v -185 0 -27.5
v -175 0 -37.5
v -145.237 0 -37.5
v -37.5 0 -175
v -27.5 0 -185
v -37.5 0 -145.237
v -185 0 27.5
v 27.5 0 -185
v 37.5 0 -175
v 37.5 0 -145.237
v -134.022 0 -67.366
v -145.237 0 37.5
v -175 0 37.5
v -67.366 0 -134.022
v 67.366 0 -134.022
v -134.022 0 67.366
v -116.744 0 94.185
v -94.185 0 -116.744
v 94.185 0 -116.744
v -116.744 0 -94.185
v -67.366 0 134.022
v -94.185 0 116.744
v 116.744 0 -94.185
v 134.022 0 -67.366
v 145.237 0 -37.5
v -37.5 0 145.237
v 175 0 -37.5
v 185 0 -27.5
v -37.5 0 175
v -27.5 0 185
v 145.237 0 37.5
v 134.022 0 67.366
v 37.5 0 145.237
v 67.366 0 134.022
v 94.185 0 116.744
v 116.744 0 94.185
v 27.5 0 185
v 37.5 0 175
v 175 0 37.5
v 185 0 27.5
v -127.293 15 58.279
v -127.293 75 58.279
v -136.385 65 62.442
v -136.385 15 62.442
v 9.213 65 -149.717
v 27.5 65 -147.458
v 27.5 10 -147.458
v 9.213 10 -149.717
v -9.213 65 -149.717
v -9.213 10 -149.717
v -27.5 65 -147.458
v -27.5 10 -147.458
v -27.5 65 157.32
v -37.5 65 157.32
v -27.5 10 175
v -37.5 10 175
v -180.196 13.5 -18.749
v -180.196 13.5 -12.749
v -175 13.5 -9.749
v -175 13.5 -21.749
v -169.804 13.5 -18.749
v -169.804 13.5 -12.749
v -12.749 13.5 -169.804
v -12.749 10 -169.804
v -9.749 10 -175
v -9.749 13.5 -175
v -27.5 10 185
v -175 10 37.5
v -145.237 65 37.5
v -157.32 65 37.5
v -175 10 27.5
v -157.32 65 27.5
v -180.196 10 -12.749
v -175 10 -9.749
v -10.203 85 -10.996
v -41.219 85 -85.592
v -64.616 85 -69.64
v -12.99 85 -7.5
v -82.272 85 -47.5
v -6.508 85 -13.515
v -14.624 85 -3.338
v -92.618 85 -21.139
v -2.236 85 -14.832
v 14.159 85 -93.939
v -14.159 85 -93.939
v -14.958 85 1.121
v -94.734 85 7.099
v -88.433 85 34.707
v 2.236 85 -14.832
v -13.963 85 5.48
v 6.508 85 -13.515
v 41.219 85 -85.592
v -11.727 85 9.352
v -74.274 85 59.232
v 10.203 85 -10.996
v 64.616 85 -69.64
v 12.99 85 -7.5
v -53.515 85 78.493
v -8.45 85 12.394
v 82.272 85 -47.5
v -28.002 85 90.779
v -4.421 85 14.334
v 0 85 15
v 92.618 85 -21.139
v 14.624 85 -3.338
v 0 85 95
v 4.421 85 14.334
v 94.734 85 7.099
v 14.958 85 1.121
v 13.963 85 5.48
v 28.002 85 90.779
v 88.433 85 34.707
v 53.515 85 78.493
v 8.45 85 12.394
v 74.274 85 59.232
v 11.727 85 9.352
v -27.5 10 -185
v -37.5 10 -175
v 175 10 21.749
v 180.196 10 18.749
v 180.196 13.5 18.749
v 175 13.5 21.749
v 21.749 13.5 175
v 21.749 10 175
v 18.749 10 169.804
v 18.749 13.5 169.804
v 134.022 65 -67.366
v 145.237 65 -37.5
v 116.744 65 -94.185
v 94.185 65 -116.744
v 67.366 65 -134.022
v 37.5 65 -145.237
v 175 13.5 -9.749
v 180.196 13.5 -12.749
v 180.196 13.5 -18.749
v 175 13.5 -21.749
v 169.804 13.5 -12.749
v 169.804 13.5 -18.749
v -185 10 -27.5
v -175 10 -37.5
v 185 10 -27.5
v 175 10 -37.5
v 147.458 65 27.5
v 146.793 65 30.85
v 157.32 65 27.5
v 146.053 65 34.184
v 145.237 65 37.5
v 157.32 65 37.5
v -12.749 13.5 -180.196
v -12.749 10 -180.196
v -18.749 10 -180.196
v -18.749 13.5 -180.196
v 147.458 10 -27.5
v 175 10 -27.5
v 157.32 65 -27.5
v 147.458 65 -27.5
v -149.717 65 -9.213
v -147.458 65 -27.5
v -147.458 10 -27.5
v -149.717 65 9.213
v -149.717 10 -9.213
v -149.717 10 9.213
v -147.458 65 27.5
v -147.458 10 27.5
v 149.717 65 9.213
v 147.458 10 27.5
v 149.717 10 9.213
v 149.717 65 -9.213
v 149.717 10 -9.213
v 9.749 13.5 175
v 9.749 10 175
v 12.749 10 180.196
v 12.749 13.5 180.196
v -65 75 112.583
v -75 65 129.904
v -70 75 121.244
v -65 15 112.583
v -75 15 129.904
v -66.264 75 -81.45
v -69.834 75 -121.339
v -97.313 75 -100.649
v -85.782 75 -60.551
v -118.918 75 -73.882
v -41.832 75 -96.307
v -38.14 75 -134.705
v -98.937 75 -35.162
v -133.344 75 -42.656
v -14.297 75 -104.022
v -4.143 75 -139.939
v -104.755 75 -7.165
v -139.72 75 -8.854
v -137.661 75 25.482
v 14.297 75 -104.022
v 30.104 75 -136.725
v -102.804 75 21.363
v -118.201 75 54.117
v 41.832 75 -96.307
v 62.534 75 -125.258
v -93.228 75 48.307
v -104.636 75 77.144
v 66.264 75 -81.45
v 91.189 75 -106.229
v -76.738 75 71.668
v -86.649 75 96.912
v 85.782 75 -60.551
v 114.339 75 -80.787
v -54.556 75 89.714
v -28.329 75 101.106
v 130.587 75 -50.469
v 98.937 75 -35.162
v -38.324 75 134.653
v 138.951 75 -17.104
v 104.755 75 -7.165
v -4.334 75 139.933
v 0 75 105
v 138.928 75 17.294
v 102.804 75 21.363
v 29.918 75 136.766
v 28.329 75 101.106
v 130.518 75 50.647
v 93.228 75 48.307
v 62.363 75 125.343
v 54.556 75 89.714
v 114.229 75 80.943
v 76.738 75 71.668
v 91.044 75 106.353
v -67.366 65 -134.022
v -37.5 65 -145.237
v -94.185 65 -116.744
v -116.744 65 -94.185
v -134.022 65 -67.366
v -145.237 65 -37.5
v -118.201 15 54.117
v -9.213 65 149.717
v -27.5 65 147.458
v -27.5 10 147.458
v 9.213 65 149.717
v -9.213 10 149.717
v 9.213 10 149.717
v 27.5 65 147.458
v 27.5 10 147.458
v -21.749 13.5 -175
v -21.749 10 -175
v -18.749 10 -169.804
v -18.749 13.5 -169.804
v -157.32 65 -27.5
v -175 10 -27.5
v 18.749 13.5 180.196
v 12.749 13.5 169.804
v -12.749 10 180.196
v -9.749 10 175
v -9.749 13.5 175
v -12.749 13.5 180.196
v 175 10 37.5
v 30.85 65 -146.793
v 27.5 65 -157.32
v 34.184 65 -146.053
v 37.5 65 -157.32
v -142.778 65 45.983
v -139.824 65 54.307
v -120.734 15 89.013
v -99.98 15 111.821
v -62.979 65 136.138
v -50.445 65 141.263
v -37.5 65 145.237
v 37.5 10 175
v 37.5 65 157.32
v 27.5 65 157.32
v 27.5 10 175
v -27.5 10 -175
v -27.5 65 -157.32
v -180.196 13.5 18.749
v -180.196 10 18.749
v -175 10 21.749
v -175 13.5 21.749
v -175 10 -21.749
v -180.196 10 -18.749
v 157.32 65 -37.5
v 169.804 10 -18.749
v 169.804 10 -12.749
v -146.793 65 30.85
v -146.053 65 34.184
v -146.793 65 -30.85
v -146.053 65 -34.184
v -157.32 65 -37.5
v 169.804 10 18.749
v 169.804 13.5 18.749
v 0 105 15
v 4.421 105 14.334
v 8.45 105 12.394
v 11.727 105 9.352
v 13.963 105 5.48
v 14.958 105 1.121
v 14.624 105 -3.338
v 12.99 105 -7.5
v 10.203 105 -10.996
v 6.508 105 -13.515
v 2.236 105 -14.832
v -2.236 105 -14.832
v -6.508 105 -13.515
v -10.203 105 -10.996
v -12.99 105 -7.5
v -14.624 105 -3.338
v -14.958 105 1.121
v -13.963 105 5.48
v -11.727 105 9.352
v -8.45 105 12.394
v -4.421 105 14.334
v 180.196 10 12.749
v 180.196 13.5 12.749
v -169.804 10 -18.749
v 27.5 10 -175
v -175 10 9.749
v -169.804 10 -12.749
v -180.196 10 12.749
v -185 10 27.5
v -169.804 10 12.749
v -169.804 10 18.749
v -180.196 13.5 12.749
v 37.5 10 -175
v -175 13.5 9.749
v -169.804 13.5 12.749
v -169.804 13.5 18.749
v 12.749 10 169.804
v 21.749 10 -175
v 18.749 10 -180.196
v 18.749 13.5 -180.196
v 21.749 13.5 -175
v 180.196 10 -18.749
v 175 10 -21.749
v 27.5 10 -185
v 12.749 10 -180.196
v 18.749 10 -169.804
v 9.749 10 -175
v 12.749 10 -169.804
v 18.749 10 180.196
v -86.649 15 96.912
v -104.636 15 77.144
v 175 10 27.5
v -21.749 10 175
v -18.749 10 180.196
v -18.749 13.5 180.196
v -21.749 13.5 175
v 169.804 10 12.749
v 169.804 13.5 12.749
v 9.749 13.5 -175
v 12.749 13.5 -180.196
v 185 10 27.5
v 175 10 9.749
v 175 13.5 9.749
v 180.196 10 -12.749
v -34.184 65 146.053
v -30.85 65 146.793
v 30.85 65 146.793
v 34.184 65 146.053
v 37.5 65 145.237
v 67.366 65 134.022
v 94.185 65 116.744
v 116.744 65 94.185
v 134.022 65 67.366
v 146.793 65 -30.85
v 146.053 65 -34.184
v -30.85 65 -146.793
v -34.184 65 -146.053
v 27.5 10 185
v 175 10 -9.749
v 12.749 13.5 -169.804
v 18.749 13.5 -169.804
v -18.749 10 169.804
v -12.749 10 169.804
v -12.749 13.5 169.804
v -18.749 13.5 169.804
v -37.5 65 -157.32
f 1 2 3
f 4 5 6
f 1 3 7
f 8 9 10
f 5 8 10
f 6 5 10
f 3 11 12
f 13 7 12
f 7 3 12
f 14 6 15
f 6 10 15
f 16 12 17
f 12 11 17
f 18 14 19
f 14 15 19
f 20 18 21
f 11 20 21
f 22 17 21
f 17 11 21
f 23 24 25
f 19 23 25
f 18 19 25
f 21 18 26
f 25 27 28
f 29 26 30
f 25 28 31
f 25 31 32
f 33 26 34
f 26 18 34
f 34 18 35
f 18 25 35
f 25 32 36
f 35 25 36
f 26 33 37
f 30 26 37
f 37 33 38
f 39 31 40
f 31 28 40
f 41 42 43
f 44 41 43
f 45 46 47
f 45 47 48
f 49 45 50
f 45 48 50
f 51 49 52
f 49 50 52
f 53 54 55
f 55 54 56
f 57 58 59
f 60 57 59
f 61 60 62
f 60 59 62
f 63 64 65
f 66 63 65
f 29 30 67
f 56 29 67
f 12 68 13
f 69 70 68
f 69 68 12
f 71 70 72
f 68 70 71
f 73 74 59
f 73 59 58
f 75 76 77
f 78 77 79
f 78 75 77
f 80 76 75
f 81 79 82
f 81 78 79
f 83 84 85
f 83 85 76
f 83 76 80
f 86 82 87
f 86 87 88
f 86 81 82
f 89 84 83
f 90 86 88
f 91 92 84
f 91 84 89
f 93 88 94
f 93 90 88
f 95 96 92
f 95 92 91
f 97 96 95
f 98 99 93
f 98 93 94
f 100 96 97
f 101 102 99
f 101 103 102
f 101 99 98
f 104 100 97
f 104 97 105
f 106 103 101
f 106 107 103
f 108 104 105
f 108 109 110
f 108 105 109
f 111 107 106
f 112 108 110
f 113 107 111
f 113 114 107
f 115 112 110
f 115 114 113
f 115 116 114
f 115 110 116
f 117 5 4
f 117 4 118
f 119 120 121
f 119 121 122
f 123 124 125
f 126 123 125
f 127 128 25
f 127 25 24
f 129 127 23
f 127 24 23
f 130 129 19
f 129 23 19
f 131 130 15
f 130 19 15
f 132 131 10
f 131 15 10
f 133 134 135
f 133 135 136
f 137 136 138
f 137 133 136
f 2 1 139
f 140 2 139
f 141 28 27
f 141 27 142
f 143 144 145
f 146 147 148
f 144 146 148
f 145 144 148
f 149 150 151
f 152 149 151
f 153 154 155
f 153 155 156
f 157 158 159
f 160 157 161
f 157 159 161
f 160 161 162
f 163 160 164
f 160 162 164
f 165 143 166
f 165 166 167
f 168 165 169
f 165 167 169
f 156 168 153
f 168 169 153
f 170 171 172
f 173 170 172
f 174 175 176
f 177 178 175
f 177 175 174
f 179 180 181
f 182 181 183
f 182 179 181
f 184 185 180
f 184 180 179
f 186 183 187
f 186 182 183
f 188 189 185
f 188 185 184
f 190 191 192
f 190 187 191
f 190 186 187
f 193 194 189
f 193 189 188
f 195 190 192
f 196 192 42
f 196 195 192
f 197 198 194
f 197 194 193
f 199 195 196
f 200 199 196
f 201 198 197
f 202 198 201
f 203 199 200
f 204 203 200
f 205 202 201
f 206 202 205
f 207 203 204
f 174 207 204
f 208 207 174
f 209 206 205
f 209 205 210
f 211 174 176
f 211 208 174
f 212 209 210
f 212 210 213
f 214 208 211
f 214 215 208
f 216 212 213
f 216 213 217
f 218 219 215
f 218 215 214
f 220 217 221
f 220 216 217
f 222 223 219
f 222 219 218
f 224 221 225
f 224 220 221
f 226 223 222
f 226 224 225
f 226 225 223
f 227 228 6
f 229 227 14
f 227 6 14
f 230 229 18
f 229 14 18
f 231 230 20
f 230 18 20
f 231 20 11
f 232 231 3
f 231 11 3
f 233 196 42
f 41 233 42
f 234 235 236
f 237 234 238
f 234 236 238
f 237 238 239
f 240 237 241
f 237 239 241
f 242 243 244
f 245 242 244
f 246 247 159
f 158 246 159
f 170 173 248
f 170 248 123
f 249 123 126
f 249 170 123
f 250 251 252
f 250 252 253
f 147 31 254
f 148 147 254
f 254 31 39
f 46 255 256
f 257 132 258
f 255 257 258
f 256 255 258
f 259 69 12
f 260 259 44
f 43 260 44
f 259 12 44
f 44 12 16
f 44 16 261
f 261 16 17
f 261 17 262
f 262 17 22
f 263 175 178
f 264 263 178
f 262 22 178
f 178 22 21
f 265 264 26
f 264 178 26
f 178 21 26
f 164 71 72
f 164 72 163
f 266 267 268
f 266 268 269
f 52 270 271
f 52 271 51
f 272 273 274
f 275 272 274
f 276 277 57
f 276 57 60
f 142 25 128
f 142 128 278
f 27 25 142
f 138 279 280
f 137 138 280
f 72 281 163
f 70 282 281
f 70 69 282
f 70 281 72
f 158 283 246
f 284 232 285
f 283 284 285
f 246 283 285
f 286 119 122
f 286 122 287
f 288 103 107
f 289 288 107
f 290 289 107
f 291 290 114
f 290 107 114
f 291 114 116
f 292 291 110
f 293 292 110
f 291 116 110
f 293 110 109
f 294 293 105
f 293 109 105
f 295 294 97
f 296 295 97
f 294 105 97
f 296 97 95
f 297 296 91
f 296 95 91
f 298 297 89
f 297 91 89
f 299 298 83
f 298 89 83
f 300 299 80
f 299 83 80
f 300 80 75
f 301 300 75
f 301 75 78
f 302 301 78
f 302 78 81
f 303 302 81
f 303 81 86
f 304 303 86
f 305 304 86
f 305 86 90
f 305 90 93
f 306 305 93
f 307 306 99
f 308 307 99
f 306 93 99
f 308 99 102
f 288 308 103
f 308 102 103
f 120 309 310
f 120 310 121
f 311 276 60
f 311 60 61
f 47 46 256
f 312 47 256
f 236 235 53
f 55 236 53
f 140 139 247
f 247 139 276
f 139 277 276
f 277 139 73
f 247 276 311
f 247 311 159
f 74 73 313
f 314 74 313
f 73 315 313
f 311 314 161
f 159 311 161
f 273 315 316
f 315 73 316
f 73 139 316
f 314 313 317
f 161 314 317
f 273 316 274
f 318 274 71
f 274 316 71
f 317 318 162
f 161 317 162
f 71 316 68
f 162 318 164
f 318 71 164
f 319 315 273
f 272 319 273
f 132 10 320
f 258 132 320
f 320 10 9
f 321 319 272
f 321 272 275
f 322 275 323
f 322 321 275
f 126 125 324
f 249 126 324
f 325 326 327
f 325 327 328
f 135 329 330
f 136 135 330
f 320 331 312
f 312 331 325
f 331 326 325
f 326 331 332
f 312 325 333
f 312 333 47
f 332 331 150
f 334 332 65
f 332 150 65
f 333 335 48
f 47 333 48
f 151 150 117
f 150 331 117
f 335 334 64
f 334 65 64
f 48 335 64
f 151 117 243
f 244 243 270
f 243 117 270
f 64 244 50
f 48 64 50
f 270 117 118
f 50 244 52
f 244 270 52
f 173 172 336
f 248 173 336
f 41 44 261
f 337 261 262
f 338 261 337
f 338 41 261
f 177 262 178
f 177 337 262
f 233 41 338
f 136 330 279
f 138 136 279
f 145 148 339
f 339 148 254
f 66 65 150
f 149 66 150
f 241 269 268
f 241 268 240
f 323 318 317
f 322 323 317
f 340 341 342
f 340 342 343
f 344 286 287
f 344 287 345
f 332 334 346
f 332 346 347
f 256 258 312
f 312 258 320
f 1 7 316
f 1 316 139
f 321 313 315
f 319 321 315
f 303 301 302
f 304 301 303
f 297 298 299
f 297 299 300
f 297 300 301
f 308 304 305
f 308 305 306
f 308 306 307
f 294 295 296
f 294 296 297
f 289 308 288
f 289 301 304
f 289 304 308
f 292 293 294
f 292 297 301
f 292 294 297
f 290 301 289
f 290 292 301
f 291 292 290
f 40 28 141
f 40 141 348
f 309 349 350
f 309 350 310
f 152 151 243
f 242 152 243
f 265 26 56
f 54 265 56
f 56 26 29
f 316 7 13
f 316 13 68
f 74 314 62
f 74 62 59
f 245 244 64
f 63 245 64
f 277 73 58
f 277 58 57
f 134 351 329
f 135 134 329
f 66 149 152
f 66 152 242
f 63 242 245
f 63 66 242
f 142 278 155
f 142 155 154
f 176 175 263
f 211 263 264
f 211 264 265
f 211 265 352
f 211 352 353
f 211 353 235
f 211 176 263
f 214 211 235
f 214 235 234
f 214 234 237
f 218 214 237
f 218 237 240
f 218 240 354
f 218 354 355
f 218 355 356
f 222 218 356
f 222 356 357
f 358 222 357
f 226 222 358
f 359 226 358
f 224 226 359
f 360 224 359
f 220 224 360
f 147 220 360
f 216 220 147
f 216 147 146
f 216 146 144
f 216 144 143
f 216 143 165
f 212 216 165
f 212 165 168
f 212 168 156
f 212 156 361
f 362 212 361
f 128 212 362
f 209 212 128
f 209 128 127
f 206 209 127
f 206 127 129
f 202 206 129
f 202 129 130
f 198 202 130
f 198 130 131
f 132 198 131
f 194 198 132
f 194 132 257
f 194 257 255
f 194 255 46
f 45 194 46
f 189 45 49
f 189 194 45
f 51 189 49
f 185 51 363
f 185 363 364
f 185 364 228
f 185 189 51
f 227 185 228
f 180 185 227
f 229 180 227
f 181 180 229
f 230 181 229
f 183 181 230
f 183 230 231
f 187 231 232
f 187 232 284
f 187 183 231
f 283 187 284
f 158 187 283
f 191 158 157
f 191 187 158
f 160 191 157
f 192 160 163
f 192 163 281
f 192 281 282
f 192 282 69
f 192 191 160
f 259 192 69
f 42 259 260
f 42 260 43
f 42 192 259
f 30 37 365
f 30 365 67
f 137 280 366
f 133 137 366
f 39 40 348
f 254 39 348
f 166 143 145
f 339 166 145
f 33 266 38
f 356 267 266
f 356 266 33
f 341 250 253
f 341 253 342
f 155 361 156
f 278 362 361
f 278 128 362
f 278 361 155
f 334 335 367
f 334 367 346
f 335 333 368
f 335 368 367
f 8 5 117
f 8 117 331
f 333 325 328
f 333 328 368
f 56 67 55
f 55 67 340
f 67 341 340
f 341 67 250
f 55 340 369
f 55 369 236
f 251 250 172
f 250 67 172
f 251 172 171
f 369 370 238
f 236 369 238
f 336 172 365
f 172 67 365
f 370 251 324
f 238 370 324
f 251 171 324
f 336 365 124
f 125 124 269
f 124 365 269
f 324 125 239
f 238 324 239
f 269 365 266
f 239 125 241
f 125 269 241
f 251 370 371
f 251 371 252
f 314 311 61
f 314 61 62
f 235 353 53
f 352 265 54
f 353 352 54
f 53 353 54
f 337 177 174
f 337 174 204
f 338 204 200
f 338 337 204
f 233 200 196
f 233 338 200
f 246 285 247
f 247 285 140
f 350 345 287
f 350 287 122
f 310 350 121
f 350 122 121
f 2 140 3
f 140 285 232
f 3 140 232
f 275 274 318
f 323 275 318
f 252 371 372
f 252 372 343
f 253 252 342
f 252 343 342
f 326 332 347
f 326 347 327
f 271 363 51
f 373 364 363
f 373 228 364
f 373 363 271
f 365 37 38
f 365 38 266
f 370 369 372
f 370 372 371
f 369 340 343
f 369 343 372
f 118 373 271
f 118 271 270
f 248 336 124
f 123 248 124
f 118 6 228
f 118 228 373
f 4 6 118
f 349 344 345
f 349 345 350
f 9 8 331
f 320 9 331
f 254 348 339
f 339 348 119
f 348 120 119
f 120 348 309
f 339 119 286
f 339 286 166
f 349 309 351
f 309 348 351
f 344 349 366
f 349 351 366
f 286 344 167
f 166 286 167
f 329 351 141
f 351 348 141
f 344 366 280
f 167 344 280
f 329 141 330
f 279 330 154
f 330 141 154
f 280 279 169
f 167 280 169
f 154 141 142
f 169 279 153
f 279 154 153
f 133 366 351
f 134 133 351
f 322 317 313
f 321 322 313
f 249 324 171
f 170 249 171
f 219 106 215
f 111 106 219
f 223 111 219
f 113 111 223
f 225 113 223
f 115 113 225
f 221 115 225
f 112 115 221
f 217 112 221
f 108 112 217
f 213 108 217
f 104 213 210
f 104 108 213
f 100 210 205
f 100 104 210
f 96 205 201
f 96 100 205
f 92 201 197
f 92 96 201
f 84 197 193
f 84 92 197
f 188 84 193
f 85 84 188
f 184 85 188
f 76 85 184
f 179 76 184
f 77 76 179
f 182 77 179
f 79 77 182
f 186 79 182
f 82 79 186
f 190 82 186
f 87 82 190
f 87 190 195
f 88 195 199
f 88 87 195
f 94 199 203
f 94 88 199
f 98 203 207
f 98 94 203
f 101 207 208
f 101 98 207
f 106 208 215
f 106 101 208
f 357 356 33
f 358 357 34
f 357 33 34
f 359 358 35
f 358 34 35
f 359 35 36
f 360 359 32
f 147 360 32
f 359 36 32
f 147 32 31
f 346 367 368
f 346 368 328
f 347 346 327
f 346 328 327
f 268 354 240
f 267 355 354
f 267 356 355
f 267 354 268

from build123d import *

# Parameters (mm, degrees)
SKETCH1_R                    = 150
BOSS_EXTRUDE1_DEPTH          = 75
CHAMFER1_SIZE                = 10
BOSS_EXTRUDE2_DEPTH          = 10
CHAMFER2_SIZE                = 10
BOSS_EXTRUDE3_DEPTH          = 10
BOSS_EXTRUDE4_DEPTH          = 3.5
CIRPATTERN1_COUNT            = 4
CIRPATTERN1_COPY_1_DEPTH     = 10
CIRPATTERN1_COPY_2_DEPTH     = 10
CIRPATTERN1_COPY_3_DEPTH     = 10
CIRPATTERN1_COPY_4_DEPTH     = 3.5
CIRPATTERN1_COPY_5_DEPTH     = 3.5
CIRPATTERN1_COPY_6_DEPTH     = 3.5
CHAMFER2_OF_CIRPATTERN1_SIZE = 10
CUT_EXTRUDE2_START           = -60
CUT_EXTRUDE2_DEPTH           = 60
SKETCH6_R                    = 110
BOSS_EXTRUDE5_DEPTH          = 10
CHAMFER3_SIZE                = 15
SKETCH7_R                    = 15
BOSS_EXTRUDE6_DEPTH          = 20


with BuildPart() as part:
    # Sketch1 → Boss-Extrude1 (new body)
    with BuildSketch(Plane(origin=(0, 0, 0), x_dir=(1, 0, 0), z_dir=(0, 1, 0))):
        with Locations(Location((0, 0, 0), (0, 0, 270))):
            Circle(SKETCH1_R)
    extrude(amount=BOSS_EXTRUDE1_DEPTH)

    # Chamfer1
    chamfer1_edges = [part.edges().sort_by_distance(p)[0] for p in [
        (0, 75, -150),
    ]]
    chamfer(chamfer1_edges, length=CHAMFER1_SIZE)

    # Sketch2 → Boss-Extrude2 (add)
    with BuildSketch(Plane.XZ):
        with BuildLine():
            Line((-145.236875483, 37.5), (-185, 37.5))
            Line((-185, 37.5), (-185, -37.5))
            Line((-185, -37.5), (-145.236875483, -37.5))
            ThreePointArc((-145.236875483, -37.5), (-150, 0), (-145.236875483, 37.5))
        make_face()
    boss_extrude2 = extrude(amount=-BOSS_EXTRUDE2_DEPTH)

    # Chamfer2
    chamfer2_edges = [part.edges().sort_by_distance(p)[0] for p in [
        (-185, 5, -37.5),
        (-185, 5, 37.5),
    ]]
    chamfer(chamfer2_edges, length=CHAMFER2_SIZE)

    # Sketch3 → Boss-Extrude3 (add)
    with BuildSketch(Plane.XY.offset(37.5)):
        Polygon((-145.236875483, 10), (-145.236875483, 65), (-157.32, 65), (-175, 10), align=None)
    boss_extrude3 = extrude(amount=-BOSS_EXTRUDE3_DEPTH)

    # Sketch4 → Boss-Extrude4 (add)
    with BuildSketch(Plane(origin=(0, 10, 0), x_dir=(1, 0, 0), z_dir=(0, 1, 0))):
        Polygon((-175, -21.74912957), (-169.803847577, -18.74912957), (-169.803847577, -12.74912957), (-175, -9.74912957), (-180.196152423, -12.74912957), (-180.196152423, -18.74912957), align=None)
    boss_extrude4 = extrude(amount=BOSS_EXTRUDE4_DEPTH)

    # Mirror1: Boss-Extrude3, Boss-Extrude4 across plane
    add(boss_extrude3.mirror(Plane.XY))
    add(boss_extrude4.mirror(Plane.XY))

    # CirPattern1: Boss-Extrude2, Boss-Extrude3, Boss-Extrude4 ×4 about axis
    cirpattern1_axis = Axis((0, 0, 0), (0, 1, 0))
    add([boss_extrude2.rotate(cirpattern1_axis, i * 360 / CIRPATTERN1_COUNT) for i in range(1, CIRPATTERN1_COUNT)])
    add([boss_extrude3.rotate(cirpattern1_axis, i * 360 / CIRPATTERN1_COUNT) for i in range(1, CIRPATTERN1_COUNT)])
    add([boss_extrude4.rotate(cirpattern1_axis, i * 360 / CIRPATTERN1_COUNT) for i in range(1, CIRPATTERN1_COUNT)])

    # CirPattern1 copy 1 sketch → CirPattern1 copy 1 (add)
    with BuildSketch(Plane(origin=(-37.5, 0, 0), x_dir=(0, 0, -1), z_dir=(-1, 0, 0))):
        Polygon((-145.236875483, -10), (-145.236875483, -65), (-157.32, -65), (-175, -10), align=None)
    extrude(amount=-CIRPATTERN1_COPY_1_DEPTH)

    # CirPattern1 copy 2 sketch → CirPattern1 copy 2 (add)
    with BuildSketch(Plane(origin=(0, 0, 37.5), x_dir=(-1, 0, 0), z_dir=(0, 0, 1))):
        Polygon((-145.236875483, -10), (-145.236875483, -65), (-157.32, -65), (-175, -10), align=None)
    extrude(amount=-CIRPATTERN1_COPY_2_DEPTH)

    # CirPattern1 copy 3 sketch → CirPattern1 copy 3 (add)
    with BuildSketch(Plane(origin=(37.5, 0, 0), x_dir=(0, 0, 1), z_dir=(1, 0, 0))):
        Polygon((-145.236875483, -10), (-145.236875483, -65), (-157.32, -65), (-175, -10), align=None)
    extrude(amount=-CIRPATTERN1_COPY_3_DEPTH)

    # CirPattern1 copy 4 sketch → CirPattern1 copy 4 (add)
    with BuildSketch(Plane(origin=(0, 10, 0), x_dir=(0, 0, -1), z_dir=(0, 1, 0))):
        Polygon((-175, 21.74912957), (-169.803847577, 18.74912957), (-169.803847577, 12.74912957), (-175, 9.74912957), (-180.196152423, 12.74912957), (-180.196152423, 18.74912957), align=None)
    extrude(amount=CIRPATTERN1_COPY_4_DEPTH)

    # CirPattern1 copy 5 sketch → CirPattern1 copy 5 (add)
    with BuildSketch(Plane(origin=(0, 10, 0), x_dir=(-1, 0, 0), z_dir=(0, 1, 0))):
        Polygon((-175, 21.74912957), (-169.803847577, 18.74912957), (-169.803847577, 12.74912957), (-175, 9.74912957), (-180.196152423, 12.74912957), (-180.196152423, 18.74912957), align=None)
    extrude(amount=CIRPATTERN1_COPY_5_DEPTH)

    # CirPattern1 copy 6 sketch → CirPattern1 copy 6 (add)
    with BuildSketch(Plane.ZX.offset(10)):
        Polygon((-175, 21.74912957), (-169.803847577, 18.74912957), (-169.803847577, 12.74912957), (-175, 9.74912957), (-180.196152423, 12.74912957), (-180.196152423, 18.74912957), align=None)
    extrude(amount=CIRPATTERN1_COPY_6_DEPTH)

    # Chamfer2 of CirPattern1
    chamfer2_of_cirpattern1_edges = [part.edges().sort_by_distance(p)[0] for p in [
        (-37.5, 5, 185),
        (37.5, 5, 185),
        (185, 5, 37.5),
        (185, 5, -37.5),
        (37.5, 5, -185),
        (-37.5, 5, -185),
    ]]
    chamfer(chamfer2_of_cirpattern1_edges, length=CHAMFER2_OF_CIRPATTERN1_SIZE)

    # Sketch5 → Cut-Extrude2 (cut)
    with BuildSketch(Plane(origin=(0, 75, 0), x_dir=(1, 0, 0), z_dir=(0, 1, 0)).offset(CUT_EXTRUDE2_START)):
        with BuildLine():
            ThreePointArc((-70, -121.24355653), (-103.548353297, -94.221751891), (-127.293055267, -58.279310916))
            Line((-127.293055267, -58.279310916), (-136.385416357, -62.442118839))
            ThreePointArc((-136.385416357, -62.442118839), (-110.944664247, -100.951877026), (-75, -129.903810568))
            Line((-75, -129.903810568), (-70, -121.24355653))
        make_face()
        with BuildLine():
            ThreePointArc((-65, -112.583302492), (-96.152042347, -87.491626756), (-118.200694176, -54.116502994))
            Line((-118.200694176, -54.116502994), (-127.293055267, -58.279310916))
            ThreePointArc((-127.293055267, -58.279310916), (-103.548353297, -94.221751891), (-70, -121.24355653))
            Line((-70, -121.24355653), (-65, -112.583302492))
        make_face()
    extrude(amount=CUT_EXTRUDE2_DEPTH, mode=Mode.SUBTRACT)

    # Sketch6 → Boss-Extrude5 (add)
    with BuildSketch(Plane(origin=(0, 75, 0), x_dir=(1, 0, 0), z_dir=(0, 1, 0))):
        with Locations(Location((0, 0, 0), (0, 0, 270))):
            Circle(SKETCH6_R)
    extrude(amount=BOSS_EXTRUDE5_DEPTH)

    # Chamfer3
    # the kernel refuses this chamfer: 15 mm, written as the material it takes off along each edge
    with BuildSketch(Plane(origin=(0, 85, 0), x_dir=(0, 0, 1), z_dir=(-1, 0, 0))) as chamfer3_piece_1_section:
        Polygon((110, -CHAMFER3_SIZE), (110 - CHAMFER3_SIZE, 0), (110, 0), align=None)
    chamfer3_piece_1 = revolve(axis=Axis((0, 85, 0), (0, 1, 0)), mode=Mode.PRIVATE)
    chamfer3_piece_1 = split(chamfer3_piece_1, bisect_by=Plane(origin=(0, 75, -100.081022807), z_dir=(0, 1, 0)), keep=Keep.TOP, mode=Mode.PRIVATE)
    add(chamfer3_piece_1, mode=Mode.SUBTRACT)

    # Sketch7 → Boss-Extrude6 (add)
    with BuildSketch(Plane(origin=(0, 85, 0), x_dir=(1, 0, 0), z_dir=(0, 1, 0))):
        with Locations(Location((0, 0, 0), (0, 0, 270))):
            Circle(SKETCH7_R)
    extrude(amount=BOSS_EXTRUDE6_DEPTH)


solid = part.part
